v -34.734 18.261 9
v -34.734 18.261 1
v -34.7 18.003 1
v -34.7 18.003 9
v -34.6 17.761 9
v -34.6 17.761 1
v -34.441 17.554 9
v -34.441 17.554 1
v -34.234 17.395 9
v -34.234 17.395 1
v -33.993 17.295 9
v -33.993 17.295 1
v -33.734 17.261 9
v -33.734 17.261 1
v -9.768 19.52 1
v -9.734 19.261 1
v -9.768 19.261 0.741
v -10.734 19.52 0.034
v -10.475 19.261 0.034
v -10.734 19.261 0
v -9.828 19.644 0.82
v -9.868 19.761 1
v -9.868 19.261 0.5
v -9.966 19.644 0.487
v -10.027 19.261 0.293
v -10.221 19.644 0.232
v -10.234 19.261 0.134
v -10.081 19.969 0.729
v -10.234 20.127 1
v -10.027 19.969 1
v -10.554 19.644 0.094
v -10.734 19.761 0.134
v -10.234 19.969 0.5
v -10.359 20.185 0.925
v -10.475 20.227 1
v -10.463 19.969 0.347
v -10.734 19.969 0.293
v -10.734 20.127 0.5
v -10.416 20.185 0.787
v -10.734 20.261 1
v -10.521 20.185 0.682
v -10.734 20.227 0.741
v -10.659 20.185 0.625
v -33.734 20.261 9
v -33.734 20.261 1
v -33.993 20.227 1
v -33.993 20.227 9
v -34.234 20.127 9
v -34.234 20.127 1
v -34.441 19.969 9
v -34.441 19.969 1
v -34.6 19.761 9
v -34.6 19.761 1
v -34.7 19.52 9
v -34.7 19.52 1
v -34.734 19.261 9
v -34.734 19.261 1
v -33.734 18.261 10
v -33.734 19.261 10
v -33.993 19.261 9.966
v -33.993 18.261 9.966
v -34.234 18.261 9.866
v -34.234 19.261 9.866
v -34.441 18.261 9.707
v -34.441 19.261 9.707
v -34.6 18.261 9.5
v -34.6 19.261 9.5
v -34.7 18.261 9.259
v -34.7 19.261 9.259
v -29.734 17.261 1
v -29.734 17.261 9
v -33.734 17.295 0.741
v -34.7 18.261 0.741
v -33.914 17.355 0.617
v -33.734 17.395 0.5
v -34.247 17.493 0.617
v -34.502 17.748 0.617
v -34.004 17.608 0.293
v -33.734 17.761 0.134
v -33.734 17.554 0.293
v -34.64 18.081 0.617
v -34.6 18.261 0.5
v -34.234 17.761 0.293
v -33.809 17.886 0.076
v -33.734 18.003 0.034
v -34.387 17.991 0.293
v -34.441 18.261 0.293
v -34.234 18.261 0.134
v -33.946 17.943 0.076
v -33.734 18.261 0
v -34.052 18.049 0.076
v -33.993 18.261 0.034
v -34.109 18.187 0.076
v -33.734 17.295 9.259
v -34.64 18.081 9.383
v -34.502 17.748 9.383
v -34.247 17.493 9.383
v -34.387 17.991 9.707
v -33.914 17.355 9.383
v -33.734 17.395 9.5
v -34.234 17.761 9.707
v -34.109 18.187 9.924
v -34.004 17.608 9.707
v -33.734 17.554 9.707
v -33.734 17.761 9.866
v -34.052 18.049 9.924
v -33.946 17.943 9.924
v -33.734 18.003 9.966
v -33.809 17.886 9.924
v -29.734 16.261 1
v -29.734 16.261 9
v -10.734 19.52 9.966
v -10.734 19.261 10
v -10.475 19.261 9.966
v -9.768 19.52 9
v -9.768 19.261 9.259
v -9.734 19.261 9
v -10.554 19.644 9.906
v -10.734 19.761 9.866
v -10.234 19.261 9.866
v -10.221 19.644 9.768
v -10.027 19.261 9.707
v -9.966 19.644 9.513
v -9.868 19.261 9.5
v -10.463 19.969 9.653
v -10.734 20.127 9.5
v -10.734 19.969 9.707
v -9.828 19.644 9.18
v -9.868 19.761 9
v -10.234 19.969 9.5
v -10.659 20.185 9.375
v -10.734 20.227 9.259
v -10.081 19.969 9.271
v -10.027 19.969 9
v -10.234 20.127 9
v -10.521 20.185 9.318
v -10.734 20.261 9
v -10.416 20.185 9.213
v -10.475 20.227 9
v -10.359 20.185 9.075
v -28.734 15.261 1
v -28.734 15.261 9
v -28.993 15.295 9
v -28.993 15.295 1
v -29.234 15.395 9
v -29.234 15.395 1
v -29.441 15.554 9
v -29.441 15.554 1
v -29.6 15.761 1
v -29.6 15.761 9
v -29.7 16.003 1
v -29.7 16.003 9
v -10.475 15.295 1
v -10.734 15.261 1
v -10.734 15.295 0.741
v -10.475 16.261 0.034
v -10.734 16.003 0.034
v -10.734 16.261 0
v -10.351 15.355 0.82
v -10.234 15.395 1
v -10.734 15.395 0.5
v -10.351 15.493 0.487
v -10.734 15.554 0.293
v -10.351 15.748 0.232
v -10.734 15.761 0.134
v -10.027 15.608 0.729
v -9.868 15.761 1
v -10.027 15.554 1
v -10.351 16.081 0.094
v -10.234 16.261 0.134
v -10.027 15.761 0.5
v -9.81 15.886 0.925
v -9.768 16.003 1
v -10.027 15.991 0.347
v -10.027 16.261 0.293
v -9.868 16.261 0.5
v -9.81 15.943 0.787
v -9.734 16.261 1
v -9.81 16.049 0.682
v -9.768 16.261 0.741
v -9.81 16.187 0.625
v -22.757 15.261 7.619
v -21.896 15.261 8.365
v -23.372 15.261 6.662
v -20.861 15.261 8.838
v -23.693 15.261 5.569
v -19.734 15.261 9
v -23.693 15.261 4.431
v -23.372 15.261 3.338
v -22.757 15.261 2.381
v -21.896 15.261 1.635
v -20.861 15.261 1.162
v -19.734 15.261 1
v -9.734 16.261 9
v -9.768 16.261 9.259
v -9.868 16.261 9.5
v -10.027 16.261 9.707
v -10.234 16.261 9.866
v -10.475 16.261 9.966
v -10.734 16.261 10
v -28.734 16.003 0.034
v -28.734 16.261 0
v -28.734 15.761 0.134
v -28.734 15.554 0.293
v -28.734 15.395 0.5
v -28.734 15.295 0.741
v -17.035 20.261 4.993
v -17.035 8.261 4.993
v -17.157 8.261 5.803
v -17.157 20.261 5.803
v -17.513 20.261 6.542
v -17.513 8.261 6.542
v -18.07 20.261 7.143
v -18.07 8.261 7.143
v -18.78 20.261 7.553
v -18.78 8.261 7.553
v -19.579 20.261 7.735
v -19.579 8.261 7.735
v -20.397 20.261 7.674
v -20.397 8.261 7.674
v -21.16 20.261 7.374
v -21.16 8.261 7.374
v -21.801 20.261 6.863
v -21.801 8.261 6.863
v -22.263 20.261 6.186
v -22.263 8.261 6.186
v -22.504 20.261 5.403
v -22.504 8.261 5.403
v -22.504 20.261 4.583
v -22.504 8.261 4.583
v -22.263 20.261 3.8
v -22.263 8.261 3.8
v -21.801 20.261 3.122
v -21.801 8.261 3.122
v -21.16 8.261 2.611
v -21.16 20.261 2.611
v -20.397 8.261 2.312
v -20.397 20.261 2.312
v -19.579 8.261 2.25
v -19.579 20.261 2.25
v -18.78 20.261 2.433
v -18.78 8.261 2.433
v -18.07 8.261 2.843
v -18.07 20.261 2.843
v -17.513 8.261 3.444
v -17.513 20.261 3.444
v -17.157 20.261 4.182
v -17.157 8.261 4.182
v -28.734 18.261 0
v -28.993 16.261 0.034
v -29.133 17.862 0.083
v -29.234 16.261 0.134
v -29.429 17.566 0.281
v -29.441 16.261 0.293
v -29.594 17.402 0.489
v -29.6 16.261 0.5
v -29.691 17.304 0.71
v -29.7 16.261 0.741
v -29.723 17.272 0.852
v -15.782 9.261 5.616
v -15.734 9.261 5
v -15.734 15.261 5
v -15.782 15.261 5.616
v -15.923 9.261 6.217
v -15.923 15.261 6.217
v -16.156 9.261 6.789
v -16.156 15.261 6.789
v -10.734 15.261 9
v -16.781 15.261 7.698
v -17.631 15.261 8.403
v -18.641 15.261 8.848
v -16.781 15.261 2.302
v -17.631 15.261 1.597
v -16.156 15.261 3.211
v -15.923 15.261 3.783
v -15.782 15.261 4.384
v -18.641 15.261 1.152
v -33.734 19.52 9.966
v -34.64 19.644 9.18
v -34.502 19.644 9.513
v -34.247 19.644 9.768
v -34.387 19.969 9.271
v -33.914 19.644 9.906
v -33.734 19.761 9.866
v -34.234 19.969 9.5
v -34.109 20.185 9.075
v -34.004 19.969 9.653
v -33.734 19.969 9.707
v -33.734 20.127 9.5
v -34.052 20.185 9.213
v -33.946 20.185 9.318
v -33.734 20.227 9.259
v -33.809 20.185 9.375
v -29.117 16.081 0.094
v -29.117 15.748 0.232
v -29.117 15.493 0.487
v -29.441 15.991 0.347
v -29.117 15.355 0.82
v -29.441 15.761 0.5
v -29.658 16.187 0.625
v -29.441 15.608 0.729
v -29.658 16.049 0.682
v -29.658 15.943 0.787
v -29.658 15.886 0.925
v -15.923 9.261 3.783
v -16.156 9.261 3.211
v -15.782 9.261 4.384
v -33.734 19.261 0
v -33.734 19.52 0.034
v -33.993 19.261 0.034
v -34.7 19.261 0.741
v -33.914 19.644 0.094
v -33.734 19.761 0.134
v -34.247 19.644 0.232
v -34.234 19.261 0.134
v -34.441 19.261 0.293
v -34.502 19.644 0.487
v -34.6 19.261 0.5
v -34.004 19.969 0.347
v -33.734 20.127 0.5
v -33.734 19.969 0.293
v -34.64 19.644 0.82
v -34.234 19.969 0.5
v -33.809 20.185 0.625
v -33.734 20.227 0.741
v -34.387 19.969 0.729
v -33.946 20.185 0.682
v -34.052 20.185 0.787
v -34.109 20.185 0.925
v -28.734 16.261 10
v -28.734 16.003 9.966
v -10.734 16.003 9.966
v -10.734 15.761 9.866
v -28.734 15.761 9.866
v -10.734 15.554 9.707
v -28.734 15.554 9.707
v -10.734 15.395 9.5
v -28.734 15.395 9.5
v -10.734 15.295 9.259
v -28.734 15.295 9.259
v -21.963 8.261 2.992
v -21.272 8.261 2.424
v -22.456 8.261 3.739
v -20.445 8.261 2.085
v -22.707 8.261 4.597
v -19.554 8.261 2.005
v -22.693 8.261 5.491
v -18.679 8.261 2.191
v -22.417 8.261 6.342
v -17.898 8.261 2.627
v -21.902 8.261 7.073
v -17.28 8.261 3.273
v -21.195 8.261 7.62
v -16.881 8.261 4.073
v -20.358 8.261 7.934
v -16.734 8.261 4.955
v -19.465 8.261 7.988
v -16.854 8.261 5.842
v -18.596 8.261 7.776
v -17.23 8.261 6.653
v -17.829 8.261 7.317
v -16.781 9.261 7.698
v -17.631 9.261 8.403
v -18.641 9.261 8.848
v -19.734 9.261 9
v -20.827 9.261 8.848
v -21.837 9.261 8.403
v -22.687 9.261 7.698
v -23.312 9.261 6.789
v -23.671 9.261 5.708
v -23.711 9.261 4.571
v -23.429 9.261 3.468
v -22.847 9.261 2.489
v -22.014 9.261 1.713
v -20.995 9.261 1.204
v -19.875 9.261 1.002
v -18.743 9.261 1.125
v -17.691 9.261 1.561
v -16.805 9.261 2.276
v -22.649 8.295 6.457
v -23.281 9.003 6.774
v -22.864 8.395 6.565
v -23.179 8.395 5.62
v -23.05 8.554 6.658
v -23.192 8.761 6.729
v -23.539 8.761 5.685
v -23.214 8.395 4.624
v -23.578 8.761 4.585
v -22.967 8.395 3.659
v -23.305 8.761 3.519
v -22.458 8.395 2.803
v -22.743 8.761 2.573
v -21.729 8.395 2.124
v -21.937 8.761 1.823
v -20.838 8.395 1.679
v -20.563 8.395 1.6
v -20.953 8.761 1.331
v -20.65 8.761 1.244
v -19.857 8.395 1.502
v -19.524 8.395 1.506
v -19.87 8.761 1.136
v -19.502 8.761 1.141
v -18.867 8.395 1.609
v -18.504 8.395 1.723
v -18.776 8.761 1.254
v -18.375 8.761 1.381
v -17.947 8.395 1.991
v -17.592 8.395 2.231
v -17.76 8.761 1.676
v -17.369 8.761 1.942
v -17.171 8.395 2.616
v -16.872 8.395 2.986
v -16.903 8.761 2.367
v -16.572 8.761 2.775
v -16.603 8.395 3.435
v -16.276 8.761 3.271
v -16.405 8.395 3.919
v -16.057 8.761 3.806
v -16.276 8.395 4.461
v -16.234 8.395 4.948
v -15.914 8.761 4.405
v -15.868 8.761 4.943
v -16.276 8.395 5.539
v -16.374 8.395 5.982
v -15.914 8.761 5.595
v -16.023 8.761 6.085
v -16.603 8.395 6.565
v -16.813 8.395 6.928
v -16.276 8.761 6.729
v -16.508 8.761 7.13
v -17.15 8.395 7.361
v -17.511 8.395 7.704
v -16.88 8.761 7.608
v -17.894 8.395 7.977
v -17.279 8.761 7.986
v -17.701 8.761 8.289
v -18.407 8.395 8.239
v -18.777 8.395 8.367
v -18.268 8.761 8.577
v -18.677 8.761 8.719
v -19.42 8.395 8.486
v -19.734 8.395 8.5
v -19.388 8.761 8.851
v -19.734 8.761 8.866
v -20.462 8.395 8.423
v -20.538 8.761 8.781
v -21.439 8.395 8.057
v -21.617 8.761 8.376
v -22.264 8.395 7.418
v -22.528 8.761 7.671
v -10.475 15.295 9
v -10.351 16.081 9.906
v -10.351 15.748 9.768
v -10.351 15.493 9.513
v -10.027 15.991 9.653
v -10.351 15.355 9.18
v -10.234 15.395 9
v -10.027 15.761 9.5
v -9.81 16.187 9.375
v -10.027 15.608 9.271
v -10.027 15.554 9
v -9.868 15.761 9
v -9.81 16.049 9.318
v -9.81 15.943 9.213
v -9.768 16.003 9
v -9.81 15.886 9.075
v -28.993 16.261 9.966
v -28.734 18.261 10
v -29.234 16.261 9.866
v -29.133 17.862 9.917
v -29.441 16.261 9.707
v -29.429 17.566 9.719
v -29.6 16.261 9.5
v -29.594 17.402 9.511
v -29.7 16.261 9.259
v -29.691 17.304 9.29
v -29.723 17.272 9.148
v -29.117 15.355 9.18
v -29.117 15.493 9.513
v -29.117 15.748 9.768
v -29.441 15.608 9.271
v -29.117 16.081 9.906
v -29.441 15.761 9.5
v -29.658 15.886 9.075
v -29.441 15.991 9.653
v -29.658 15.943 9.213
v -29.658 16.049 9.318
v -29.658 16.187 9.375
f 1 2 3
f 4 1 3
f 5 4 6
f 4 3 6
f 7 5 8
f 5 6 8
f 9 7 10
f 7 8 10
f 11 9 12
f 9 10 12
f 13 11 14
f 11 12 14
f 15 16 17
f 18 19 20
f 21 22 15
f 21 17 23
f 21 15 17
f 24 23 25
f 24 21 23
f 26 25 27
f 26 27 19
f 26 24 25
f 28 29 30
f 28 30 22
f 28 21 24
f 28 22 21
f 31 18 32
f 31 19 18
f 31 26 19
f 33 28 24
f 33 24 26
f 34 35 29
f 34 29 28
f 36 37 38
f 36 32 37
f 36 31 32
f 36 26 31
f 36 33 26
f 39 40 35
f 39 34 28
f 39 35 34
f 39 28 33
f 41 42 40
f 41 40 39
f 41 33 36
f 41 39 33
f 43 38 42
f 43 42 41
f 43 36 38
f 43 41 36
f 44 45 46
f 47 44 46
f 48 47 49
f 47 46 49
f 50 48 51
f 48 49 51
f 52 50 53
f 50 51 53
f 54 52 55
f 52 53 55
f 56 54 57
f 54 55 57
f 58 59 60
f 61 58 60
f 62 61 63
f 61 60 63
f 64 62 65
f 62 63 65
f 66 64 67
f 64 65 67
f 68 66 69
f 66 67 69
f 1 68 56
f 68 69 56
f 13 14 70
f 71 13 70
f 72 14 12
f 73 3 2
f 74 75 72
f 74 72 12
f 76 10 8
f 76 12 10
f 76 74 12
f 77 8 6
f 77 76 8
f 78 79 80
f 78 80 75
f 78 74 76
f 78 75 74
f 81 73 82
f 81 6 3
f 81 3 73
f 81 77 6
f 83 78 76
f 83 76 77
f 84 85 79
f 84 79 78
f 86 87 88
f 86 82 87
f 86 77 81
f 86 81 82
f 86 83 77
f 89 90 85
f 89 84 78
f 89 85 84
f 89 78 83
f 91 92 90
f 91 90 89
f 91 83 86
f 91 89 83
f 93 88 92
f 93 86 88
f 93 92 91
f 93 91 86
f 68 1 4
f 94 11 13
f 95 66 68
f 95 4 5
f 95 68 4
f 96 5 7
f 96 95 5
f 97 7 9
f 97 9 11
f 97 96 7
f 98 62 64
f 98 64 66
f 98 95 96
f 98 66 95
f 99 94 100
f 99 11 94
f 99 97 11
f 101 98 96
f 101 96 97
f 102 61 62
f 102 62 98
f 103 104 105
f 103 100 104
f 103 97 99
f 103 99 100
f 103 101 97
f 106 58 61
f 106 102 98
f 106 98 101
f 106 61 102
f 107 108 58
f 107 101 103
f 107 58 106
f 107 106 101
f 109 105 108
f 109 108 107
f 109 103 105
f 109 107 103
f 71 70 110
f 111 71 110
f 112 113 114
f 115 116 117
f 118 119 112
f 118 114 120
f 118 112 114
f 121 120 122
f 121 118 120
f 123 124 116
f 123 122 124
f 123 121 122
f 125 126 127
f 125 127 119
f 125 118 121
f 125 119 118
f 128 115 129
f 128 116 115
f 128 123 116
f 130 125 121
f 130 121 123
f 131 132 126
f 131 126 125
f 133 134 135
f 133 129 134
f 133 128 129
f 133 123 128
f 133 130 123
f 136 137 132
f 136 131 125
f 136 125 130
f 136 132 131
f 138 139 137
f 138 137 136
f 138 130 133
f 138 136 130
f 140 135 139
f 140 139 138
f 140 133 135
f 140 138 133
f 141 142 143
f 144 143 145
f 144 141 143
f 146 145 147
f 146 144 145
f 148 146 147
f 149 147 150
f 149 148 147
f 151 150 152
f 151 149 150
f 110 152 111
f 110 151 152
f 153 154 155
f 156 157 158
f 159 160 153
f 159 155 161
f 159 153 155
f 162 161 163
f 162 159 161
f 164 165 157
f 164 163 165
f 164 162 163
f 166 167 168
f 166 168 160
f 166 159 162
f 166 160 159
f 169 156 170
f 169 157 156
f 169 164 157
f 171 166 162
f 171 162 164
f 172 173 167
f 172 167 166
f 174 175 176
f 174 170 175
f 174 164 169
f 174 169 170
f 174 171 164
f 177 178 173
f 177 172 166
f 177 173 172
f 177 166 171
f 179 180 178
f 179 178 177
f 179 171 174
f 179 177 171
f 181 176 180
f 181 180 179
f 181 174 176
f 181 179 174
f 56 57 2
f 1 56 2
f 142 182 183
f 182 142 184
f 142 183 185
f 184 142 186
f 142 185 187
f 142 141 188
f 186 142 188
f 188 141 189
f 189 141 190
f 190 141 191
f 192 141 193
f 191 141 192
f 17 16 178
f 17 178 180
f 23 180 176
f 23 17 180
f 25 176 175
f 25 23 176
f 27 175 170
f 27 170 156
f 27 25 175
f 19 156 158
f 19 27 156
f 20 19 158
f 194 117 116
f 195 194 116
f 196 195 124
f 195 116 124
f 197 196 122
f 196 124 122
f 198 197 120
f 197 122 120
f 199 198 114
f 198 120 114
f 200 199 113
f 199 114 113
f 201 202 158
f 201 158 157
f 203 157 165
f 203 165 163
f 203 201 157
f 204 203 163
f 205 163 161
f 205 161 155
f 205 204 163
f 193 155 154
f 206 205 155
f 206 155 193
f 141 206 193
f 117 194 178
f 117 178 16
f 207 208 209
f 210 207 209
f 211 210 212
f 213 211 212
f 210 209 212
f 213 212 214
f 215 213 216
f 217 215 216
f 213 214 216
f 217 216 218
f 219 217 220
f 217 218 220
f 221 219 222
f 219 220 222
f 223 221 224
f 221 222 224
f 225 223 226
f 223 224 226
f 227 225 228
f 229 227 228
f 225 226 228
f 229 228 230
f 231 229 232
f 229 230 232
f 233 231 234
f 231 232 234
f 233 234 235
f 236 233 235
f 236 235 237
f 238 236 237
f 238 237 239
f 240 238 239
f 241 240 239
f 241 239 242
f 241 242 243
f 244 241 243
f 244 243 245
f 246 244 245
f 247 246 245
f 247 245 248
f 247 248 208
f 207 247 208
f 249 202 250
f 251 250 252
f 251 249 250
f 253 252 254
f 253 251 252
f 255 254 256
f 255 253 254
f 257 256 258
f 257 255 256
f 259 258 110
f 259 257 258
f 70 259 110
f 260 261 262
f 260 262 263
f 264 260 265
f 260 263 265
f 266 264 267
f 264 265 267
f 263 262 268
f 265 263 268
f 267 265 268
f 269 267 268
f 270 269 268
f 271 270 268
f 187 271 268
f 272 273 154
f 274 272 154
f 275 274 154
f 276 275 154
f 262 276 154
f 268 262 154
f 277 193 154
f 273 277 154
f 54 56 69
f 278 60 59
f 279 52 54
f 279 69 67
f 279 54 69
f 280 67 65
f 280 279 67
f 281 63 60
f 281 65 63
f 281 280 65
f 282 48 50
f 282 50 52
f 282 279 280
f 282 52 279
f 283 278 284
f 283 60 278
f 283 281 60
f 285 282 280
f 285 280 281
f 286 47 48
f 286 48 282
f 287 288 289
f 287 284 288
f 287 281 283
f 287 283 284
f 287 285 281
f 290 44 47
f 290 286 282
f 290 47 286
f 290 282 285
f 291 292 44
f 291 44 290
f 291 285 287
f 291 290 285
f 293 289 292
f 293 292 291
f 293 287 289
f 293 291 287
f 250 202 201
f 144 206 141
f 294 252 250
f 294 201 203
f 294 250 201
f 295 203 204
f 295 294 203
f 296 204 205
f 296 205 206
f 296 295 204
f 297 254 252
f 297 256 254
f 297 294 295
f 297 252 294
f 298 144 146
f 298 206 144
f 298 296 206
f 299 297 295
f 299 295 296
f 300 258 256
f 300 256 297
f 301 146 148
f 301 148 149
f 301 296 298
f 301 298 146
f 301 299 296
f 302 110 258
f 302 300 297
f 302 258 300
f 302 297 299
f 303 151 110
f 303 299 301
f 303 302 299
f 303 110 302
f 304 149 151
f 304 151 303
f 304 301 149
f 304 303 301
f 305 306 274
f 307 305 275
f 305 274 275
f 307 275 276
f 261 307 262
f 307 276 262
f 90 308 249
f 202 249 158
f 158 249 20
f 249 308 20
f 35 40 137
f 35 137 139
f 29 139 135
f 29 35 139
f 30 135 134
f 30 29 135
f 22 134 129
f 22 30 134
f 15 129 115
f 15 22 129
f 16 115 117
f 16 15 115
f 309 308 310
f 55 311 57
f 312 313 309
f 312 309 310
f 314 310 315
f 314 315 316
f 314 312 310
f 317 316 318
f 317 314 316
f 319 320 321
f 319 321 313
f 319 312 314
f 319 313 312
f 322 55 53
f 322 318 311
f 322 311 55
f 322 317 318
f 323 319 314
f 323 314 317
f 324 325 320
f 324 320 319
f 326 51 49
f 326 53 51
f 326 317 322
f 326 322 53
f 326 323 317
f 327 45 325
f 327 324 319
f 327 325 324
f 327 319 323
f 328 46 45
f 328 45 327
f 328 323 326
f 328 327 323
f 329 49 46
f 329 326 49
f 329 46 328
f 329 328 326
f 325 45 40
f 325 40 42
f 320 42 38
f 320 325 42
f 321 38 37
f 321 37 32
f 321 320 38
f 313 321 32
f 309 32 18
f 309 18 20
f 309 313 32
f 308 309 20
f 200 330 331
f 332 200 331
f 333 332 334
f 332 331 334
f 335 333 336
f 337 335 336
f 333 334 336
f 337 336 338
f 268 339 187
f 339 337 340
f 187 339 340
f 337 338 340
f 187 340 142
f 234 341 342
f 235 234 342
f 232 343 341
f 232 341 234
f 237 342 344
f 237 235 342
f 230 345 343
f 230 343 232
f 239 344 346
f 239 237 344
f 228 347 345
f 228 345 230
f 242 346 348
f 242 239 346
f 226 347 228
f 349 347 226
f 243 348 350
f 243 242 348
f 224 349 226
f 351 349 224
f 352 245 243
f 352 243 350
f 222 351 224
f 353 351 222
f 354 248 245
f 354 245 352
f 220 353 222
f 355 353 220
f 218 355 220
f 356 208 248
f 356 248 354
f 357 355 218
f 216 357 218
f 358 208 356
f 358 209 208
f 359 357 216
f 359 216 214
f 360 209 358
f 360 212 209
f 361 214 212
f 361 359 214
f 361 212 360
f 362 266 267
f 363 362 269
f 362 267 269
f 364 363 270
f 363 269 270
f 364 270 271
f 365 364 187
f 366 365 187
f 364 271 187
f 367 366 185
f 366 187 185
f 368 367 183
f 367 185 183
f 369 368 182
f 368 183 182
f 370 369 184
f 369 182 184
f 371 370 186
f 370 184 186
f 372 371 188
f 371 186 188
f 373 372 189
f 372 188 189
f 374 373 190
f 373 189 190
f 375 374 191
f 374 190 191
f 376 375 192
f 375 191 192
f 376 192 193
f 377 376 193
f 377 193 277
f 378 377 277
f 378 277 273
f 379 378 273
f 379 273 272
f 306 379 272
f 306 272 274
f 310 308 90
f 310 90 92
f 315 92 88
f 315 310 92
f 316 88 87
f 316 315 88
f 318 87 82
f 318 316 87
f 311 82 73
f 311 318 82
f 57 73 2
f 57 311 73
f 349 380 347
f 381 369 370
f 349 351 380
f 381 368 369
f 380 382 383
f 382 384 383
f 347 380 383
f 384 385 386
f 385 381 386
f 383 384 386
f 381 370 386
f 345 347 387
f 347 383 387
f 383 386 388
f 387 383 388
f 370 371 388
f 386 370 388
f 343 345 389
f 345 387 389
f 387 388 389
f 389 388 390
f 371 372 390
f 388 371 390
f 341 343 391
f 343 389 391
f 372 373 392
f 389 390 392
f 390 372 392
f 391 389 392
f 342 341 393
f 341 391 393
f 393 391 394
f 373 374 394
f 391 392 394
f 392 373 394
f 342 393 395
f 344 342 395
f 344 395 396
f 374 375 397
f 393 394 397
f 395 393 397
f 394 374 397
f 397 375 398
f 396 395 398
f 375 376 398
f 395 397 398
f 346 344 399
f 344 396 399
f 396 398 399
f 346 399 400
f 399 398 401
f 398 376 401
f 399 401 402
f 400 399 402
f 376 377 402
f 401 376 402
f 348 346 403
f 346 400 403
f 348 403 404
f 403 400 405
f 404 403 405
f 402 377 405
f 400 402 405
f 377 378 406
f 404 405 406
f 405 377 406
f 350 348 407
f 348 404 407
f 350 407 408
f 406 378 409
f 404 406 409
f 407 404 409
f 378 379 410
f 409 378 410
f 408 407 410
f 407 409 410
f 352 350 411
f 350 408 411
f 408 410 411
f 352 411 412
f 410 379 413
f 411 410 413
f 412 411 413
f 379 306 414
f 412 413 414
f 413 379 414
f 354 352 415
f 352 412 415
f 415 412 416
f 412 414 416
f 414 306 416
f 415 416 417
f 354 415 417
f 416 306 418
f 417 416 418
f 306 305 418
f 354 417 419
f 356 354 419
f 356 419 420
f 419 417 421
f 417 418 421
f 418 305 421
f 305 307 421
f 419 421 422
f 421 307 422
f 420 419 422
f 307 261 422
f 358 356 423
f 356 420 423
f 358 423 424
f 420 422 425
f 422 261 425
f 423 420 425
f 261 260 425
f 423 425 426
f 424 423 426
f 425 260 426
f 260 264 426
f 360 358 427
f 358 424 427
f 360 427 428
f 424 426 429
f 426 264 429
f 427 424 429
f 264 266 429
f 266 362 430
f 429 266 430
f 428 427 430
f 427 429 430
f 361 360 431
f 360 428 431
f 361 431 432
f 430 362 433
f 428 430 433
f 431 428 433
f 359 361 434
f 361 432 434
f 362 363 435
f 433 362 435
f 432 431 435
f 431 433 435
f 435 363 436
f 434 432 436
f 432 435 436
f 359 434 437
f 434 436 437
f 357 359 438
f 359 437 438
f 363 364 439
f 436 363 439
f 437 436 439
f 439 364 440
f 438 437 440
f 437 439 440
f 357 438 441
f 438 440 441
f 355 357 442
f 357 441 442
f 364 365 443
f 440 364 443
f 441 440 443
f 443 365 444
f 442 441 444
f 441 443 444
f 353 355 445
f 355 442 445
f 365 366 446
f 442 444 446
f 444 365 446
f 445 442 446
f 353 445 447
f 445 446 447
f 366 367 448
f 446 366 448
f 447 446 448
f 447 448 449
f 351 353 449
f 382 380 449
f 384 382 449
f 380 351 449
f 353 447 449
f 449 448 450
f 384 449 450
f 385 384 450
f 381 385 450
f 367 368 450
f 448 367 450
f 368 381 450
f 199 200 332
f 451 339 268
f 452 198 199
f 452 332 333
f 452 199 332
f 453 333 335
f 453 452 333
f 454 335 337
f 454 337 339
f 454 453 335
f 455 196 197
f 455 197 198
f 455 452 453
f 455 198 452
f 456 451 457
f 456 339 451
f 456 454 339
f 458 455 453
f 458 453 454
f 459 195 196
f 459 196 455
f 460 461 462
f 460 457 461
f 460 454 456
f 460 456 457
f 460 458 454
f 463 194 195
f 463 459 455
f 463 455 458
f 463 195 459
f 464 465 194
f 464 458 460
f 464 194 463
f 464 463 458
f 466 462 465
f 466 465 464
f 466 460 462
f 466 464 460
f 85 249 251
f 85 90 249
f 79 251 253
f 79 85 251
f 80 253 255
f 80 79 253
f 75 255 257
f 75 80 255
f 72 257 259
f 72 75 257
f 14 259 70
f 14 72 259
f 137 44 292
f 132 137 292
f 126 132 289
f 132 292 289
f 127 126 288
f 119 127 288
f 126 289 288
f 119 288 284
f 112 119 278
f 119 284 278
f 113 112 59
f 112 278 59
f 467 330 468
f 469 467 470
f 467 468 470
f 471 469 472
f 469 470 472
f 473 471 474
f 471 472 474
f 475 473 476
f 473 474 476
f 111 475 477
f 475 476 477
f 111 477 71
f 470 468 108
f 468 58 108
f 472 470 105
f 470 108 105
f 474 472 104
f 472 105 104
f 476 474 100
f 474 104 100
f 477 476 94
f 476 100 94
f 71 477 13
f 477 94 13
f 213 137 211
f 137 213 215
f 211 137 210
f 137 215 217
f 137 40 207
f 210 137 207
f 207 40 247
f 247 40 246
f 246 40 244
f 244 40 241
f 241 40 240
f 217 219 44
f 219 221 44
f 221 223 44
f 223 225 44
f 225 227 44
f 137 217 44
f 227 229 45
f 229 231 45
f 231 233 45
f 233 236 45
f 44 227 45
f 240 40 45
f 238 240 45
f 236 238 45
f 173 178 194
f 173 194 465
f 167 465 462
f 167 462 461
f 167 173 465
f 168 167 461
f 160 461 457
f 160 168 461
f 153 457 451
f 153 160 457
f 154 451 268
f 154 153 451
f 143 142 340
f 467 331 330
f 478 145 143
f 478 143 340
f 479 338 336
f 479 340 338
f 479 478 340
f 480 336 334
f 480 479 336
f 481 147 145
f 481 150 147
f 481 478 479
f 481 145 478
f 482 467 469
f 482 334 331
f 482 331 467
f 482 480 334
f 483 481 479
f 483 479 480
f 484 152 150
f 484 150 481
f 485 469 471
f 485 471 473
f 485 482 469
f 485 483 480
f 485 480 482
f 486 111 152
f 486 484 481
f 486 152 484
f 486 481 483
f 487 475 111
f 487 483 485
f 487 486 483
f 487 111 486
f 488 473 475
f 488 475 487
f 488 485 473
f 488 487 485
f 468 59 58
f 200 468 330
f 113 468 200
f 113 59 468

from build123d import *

# Parameters (mm, degrees)
F1_DEPTH     = 10
F3_DEPTH     = 7
F5_D         = 5.5
F6_T1_DEPTH  = 3
F6_T3_DEPTH  = 1
F6_T5_DEPTH  = 8
F6_T7_DEPTH  = 23
F6_T9_DEPTH  = 18
F6_T11_DEPTH = 4
F6_T13_DEPTH = 1
F6_S17_W     = 1
F6_S17_H     = 1
F6_T18_DEPTH = 1
F6_S23_W     = 1
F6_S23_H     = 1
F6_T24_DEPTH = 1
F6_S29_W     = 1
F6_S29_H     = 1
F6_T30_DEPTH = 1
F6_S35_W     = 1
F6_S35_H     = 1
F6_T36_DEPTH = 1
F6_S41_W     = 1
F6_S41_H     = 1
F6_T42_DEPTH = 1
F6_S47_W     = 1
F6_S47_H     = 1
F6_T48_DEPTH = 1
F6_S53_W     = 1
F6_S53_H     = 1
F6_T54_DEPTH = 1
F6_S59_W     = 1
F6_S59_H     = 1
F6_T60_DEPTH = 1
F6_S65_W     = 1
F6_S65_H     = 1
F6_T66_DEPTH = 1
F6_S71_W     = 1
F6_S71_H     = 1
F6_T72_DEPTH = 1
F6_T81_DEPTH = 6.5
F6_T85_DEPTH = 3.5
F6_T92_DEPTH = 6.5
F6_T96_DEPTH = 3.5


# Not quite as in the source:
# - a fillet or chamfer that OpenCascade refuses, or shapes differently, is made with other operations: its cross-section is extruded or revolved along the edge and cut away or added


with BuildPart() as f1:
    # F0 (on Top) → F1 (new body)
    with BuildSketch(Plane.XY):
        Polygon((-9.7338430583, 20.2614087611), (-34.7338430583, 20.2614087611), (-34.7338430583, 17.2614087611), (-29.7338430583, 17.2614087611), (-29.7338430583, 15.2614087611), (-9.7338430583, 15.2614087611), align=None)
    extrude(amount=F1_DEPTH)

    # F2 (on face) → F3 (join)
    with BuildSketch(Plane.XZ.offset(-15.2614087611)):
        with BuildLine():
            Line((-16.1561342943, 3.211145618), (-19.7338430583, 5))
            Line((-19.7338430583, 5), (-23.3115518223, 3.211145618))
            ThreePointArc((-23.3115518223, 3.211145618), (-19.7338430583, 1), (-16.1561342943, 3.211145618))
        make_face()
        with BuildLine():
            Line((-16.1561342943, 6.788854382), (-19.7338430583, 5))
            Line((-19.7338430583, 5), (-16.1561342943, 3.211145618))
            ThreePointArc((-16.1561342943, 3.211145618), (-15.8408471005, 4.0809883178), (-15.7338430583, 5))
            ThreePointArc((-15.7338430583, 5), (-15.8408471005, 5.9190116822), (-16.1561342943, 6.788854382))
        make_face()
        with BuildLine():
            ThreePointArc((-16.1561342943, 6.788854382), (-19.7338430583, 9), (-23.3115518223, 6.788854382))
            Line((-23.3115518223, 6.788854382), (-19.7338430583, 5))
            Line((-19.7338430583, 5), (-16.1561342943, 6.788854382))
        make_face()
        with BuildLine():
            Line((-19.7338430583, 5), (-23.3115518223, 6.788854382))
            ThreePointArc((-23.3115518223, 6.788854382), (-23.7338430583, 5), (-23.3115518223, 3.211145618))
            Line((-23.3115518223, 3.211145618), (-19.7338430583, 5))
        make_face()
    extrude(amount=F3_DEPTH)

    # F5 (through all)
    with Locations(Plane(origin=(0, 20.2614087611, 0), x_dir=(-1, 0, 0), z_dir=(0, 1, 0))):
        with Locations((19.7849275367, 4.9927774844)):
            Hole(F5_D / 2)

    # F6: fillet of radius 1 on 18 edges, made by hand

    # F6_s2 → F6_t1 (cut)
    with BuildSketch(Plane.XZ.offset(-19.2614087611)):
        with BuildLine():
            ThreePointArc((-9.7338430583, 9), (-10.0267362772, 9.7071067812), (-10.7338430583, 10))
            Line((-10.7338430583, 10), (-9.7338430583, 10))
            Line((-9.7338430583, 10), (-9.7338430583, 9))
        make_face()
        with BuildLine():
            ThreePointArc((-9.7338430583, 1), (-10.0267362772, 0.2928932188), (-10.7338430583, 0))
            Line((-10.7338430583, 0), (-9.7338430583, 0))
            Line((-9.7338430583, 0), (-9.7338430583, 1))
        make_face()
    extrude(amount=F6_T1_DEPTH, mode=Mode.SUBTRACT)

    # F6_s4 → F6_t3 (cut)
    with BuildSketch(Plane.XZ.offset(-19.2614087611)):
        with BuildLine():
            ThreePointArc((-33.7338430583, 10), (-34.4409498395, 9.7071067812), (-34.7338430583, 9))
            Line((-34.7338430583, 9), (-34.7338430583, 10))
            Line((-34.7338430583, 10), (-33.7338430583, 10))
        make_face()
        with BuildLine():
            ThreePointArc((-33.7338430583, 0), (-34.4409498395, 0.2928932188), (-34.7338430583, 1))
            Line((-34.7338430583, 1), (-34.7338430583, 0))
            Line((-34.7338430583, 0), (-33.7338430583, 0))
        make_face()
    extrude(amount=F6_T3_DEPTH, mode=Mode.SUBTRACT)

    # F6_s6 → F6_t5 (cut)
    with BuildSketch(Plane.XY.offset(1)):
        with BuildLine():
            ThreePointArc((-33.7338430583, 20.2614087611), (-34.4409498395, 19.9685155423), (-34.7338430583, 19.2614087611))
            Line((-34.7338430583, 19.2614087611), (-34.7338430583, 20.2614087611))
            Line((-34.7338430583, 20.2614087611), (-33.7338430583, 20.2614087611))
        make_face()
        with BuildLine():
            ThreePointArc((-34.7338430583, 18.2614087611), (-34.4409498395, 17.55430198), (-33.7338430583, 17.2614087611))
            Line((-33.7338430583, 17.2614087611), (-34.7338430583, 17.2614087611))
            Line((-34.7338430583, 17.2614087611), (-34.7338430583, 18.2614087611))
        make_face()
        with BuildLine():
            ThreePointArc((-10.7338430583, 20.2614087611), (-10.0267362772, 19.9685155423), (-9.7338430583, 19.2614087611))
            Line((-9.7338430583, 19.2614087611), (-9.7338430583, 20.2614087611))
            Line((-9.7338430583, 20.2614087611), (-10.7338430583, 20.2614087611))
        make_face()
        with BuildLine():
            ThreePointArc((-28.7338430583, 15.2614087611), (-29.4409498395, 15.55430198), (-29.7338430583, 16.2614087611))
            Line((-29.7338430583, 16.2614087611), (-29.7338430583, 15.2614087611))
            Line((-29.7338430583, 15.2614087611), (-28.7338430583, 15.2614087611))
        make_face()
        with BuildLine():
            ThreePointArc((-9.7338430583, 16.2614087611), (-10.0267362772, 15.55430198), (-10.7338430583, 15.2614087611))
            Line((-10.7338430583, 15.2614087611), (-9.7338430583, 15.2614087611))
            Line((-9.7338430583, 15.2614087611), (-9.7338430583, 16.2614087611))
        make_face()
    extrude(amount=F6_T5_DEPTH, mode=Mode.SUBTRACT)

    # F6_s8 → F6_t7 (cut)
    with BuildSketch(Plane.YZ.offset(-33.7338430583)):
        with BuildLine():
            ThreePointArc((20.2614087611, 1), (19.9685155423, 0.2928932188), (19.2614087611, 0))
            Line((19.2614087611, 0), (20.2614087611, 0))
            Line((20.2614087611, 0), (20.2614087611, 1))
        make_face()
        with BuildLine():
            ThreePointArc((20.2614087611, 9), (19.9685155423, 9.7071067812), (19.2614087611, 10))
            Line((19.2614087611, 10), (20.2614087611, 10))
            Line((20.2614087611, 10), (20.2614087611, 9))
        make_face()
    extrude(amount=F6_T7_DEPTH, mode=Mode.SUBTRACT)

    # F6_s10 → F6_t9 (cut)
    with BuildSketch(Plane.YZ.offset(-28.7338430583)):
        with BuildLine():
            ThreePointArc((16.2614087611, 0), (15.55430198, 0.2928932188), (15.2614087611, 1))
            Line((15.2614087611, 1), (15.2614087611, 0))
            Line((15.2614087611, 0), (16.2614087611, 0))
        make_face()
        with BuildLine():
            ThreePointArc((16.2614087611, 10), (15.55430198, 9.7071067812), (15.2614087611, 9))
            Line((15.2614087611, 9), (15.2614087611, 10))
            Line((15.2614087611, 10), (16.2614087611, 10))
        make_face()
    extrude(amount=F6_T9_DEPTH, mode=Mode.SUBTRACT)

    # F6_s12 → F6_t11 (cut)
    with BuildSketch(Plane.YZ.offset(-33.7338430583)):
        with BuildLine():
            ThreePointArc((18.2614087611, 0), (17.55430198, 0.2928932188), (17.2614087611, 1))
            Line((17.2614087611, 1), (17.2614087611, 0))
            Line((17.2614087611, 0), (18.2614087611, 0))
        make_face()
        with BuildLine():
            ThreePointArc((18.2614087611, 10), (17.55430198, 9.7071067812), (17.2614087611, 9))
            Line((17.2614087611, 9), (17.2614087611, 10))
            Line((17.2614087611, 10), (18.2614087611, 10))
        make_face()
    extrude(amount=F6_T11_DEPTH, mode=Mode.SUBTRACT)

    # F6_s14 → F6_t13 (cut)
    with BuildSketch(Plane.XZ.offset(-17.2614087611)):
        with BuildLine():
            ThreePointArc((-28.7338430583, 0), (-29.4409498395, 0.2928932188), (-29.7338430583, 1))
            Line((-29.7338430583, 1), (-29.7338430583, 0))
            Line((-29.7338430583, 0), (-28.7338430583, 0))
        make_face()
        with BuildLine():
            ThreePointArc((-28.7338430583, 10), (-29.4409498395, 9.7071067812), (-29.7338430583, 9))
            Line((-29.7338430583, 9), (-29.7338430583, 10))
            Line((-29.7338430583, 10), (-28.7338430583, 10))
        make_face()
    extrude(amount=F6_T13_DEPTH, mode=Mode.SUBTRACT)


with BuildPart() as f6_tool16:
    # F6_s17 → F6_t18 (new body)
    with BuildSketch(Plane.YZ.offset(-10.7338430583)):
        with Locations((15.7614087611, 9.5)):
            Rectangle(F6_S17_W, F6_S17_H)
    extrude(amount=F6_T18_DEPTH)

    # F6_s19 → F6_t20 (revolve, cut)
    with BuildSketch(Plane(origin=(-10.7338430583, 16.2614087611, 9), x_dir=(0, 0.7071067812, -0.7071067812), z_dir=(0, -0.7071067812, -0.7071067812))):
        with BuildLine():
            ThreePointArc((0, -1), (1, 0), (0, 1))
            Line((0, 1), (0, -1))
        make_face()
    revolve(axis=Axis((-10.7338430583, 16.2614087611, 9), (1, 0, 0)), mode=Mode.SUBTRACT)


with BuildPart() as f1_1:
    add(f1.part)

    # F6_t15: cut F6_tool16
    add(f6_tool16.part, mode=Mode.SUBTRACT)


with BuildPart() as f6_tool22:
    # F6_s23 → F6_t24 (new body)
    with BuildSketch(Plane.XZ.offset(-19.2614087611)):
        with Locations((-10.2338430583, 9.5)):
            Rectangle(F6_S23_W, F6_S23_H)
    extrude(amount=-F6_T24_DEPTH)

    # F6_s25 → F6_t26 (revolve, cut)
    with BuildSketch(Plane(origin=(-10.7338430583, 19.2614087611, 9), x_dir=(-0.7071067812, 0, -0.7071067812), z_dir=(0.7071067812, 0, -0.7071067812))):
        with BuildLine():
            ThreePointArc((0, -1), (1, 0), (0, 1))
            Line((0, 1), (0, -1))
        make_face()
    revolve(axis=Axis((-10.7338430583, 19.2614087611, 9), (0, 1, 0)), mode=Mode.SUBTRACT)


with BuildPart() as f1_2:
    add(f1_1.part)

    # F6_t21: cut F6_tool22
    add(f6_tool22.part, mode=Mode.SUBTRACT)


with BuildPart() as f6_tool28:
    # F6_s29 → F6_t30 (new body)
    with BuildSketch(Plane.YZ.offset(-10.7338430583)):
        with Locations((15.7614087611, 0.5)):
            Rectangle(F6_S29_W, F6_S29_H)
    extrude(amount=F6_T30_DEPTH)

    # F6_s31 → F6_t32 (revolve, cut)
    with BuildSketch(Plane(origin=(-10.7338430583, 16.2614087611, 1), x_dir=(0, 0.7071067812, 0.7071067812), z_dir=(0, 0.7071067812, -0.7071067812))):
        with BuildLine():
            ThreePointArc((0, -1), (1, 0), (0, 1))
            Line((0, 1), (0, -1))
        make_face()
    revolve(axis=Axis((-10.7338430583, 16.2614087611, 1), (1, 0, 0)), mode=Mode.SUBTRACT)


with BuildPart() as f1_3:
    add(f1_2.part)

    # F6_t27: cut F6_tool28
    add(f6_tool28.part, mode=Mode.SUBTRACT)


with BuildPart() as f6_tool34:
    # F6_s35 → F6_t36 (new body)
    with BuildSketch(Plane.XZ.offset(-19.2614087611)):
        with Locations((-10.2338430583, 0.5)):
            Rectangle(F6_S35_W, F6_S35_H)
    extrude(amount=-F6_T36_DEPTH)

    # F6_s37 → F6_t38 (revolve, cut)
    with BuildSketch(Plane(origin=(-10.7338430583, 19.2614087611, 1), x_dir=(-0.7071067812, 0, 0.7071067812), z_dir=(-0.7071067812, 0, -0.7071067812))):
        with BuildLine():
            ThreePointArc((0, -1), (1, 0), (0, 1))
            Line((0, 1), (0, -1))
        make_face()
    revolve(axis=Axis((-10.7338430583, 19.2614087611, 1), (0, 1, 0)), mode=Mode.SUBTRACT)


with BuildPart() as f1_4:
    add(f1_3.part)

    # F6_t33: cut F6_tool34
    add(f6_tool34.part, mode=Mode.SUBTRACT)


with BuildPart() as f6_tool40:
    # F6_s41 → F6_t42 (new body)
    with BuildSketch(Plane.XZ.offset(-19.2614087611)):
        with Locations((-34.2338430583, 9.5)):
            Rectangle(F6_S41_W, F6_S41_H)
    extrude(amount=-F6_T42_DEPTH)

    # F6_s43 → F6_t44 (revolve, cut)
    with BuildSketch(Plane(origin=(-33.7338430583, 19.2614087611, 9), x_dir=(0.7071067812, 0, -0.7071067812), z_dir=(0.7071067812, 0, 0.7071067812))):
        with BuildLine():
            ThreePointArc((0, -1), (1, 0), (0, 1))
            Line((0, 1), (0, -1))
        make_face()
    revolve(axis=Axis((-33.7338430583, 19.2614087611, 9), (0, 1, 0)), mode=Mode.SUBTRACT)


with BuildPart() as f1_5:
    add(f1_4.part)

    # F6_t39: cut F6_tool40
    add(f6_tool40.part, mode=Mode.SUBTRACT)


with BuildPart() as f6_tool46:
    # F6_s47 → F6_t48 (new body)
    with BuildSketch(Plane.XY.offset(9)):
        with Locations((-34.2338430583, 17.7614087611)):
            Rectangle(F6_S47_W, F6_S47_H)
    extrude(amount=F6_T48_DEPTH)

    # F6_s49 → F6_t50 (revolve, cut)
    with BuildSketch(Plane(origin=(-33.7338430583, 18.2614087611, 9), x_dir=(0.7071067812, 0.7071067812, 0), z_dir=(0.7071067812, -0.7071067812, 0))):
        with BuildLine():
            ThreePointArc((0, -1), (1, 0), (0, 1))
            Line((0, 1), (0, -1))
        make_face()
    revolve(axis=Axis((-33.7338430583, 18.2614087611, 9), (0, 0, 1)), mode=Mode.SUBTRACT)


with BuildPart() as f1_6:
    add(f1_5.part)

    # F6_t45: cut F6_tool46
    add(f6_tool46.part, mode=Mode.SUBTRACT)


with BuildPart() as f6_tool52:
    # F6_s53 → F6_t54 (new body)
    with BuildSketch(Plane.XZ.offset(-19.2614087611)):
        with Locations((-34.2338430583, 0.5)):
            Rectangle(F6_S53_W, F6_S53_H)
    extrude(amount=-F6_T54_DEPTH)

    # F6_s55 → F6_t56 (revolve, cut)
    with BuildSketch(Plane(origin=(-33.7338430583, 19.2614087611, 1), x_dir=(0.7071067812, 0, 0.7071067812), z_dir=(-0.7071067812, 0, 0.7071067812))):
        with BuildLine():
            ThreePointArc((0, -1), (1, 0), (0, 1))
            Line((0, 1), (0, -1))
        make_face()
    revolve(axis=Axis((-33.7338430583, 19.2614087611, 1), (0, 1, 0)), mode=Mode.SUBTRACT)


with BuildPart() as f1_7:
    add(f1_6.part)

    # F6_t51: cut F6_tool52
    add(f6_tool52.part, mode=Mode.SUBTRACT)


with BuildPart() as f6_tool58:
    # F6_s59 → F6_t60 (new body)
    with BuildSketch(Plane.XY.offset(1)):
        with Locations((-34.2338430583, 17.7614087611)):
            Rectangle(F6_S59_W, F6_S59_H)
    extrude(amount=-F6_T60_DEPTH)

    # F6_s61 → F6_t62 (revolve, cut)
    with BuildSketch(Plane(origin=(-33.7338430583, 18.2614087611, 1), x_dir=(0.7071067812, 0.7071067812, 0), z_dir=(-0.7071067812, 0.7071067812, 0))):
        with BuildLine():
            ThreePointArc((0, -1), (1, 0), (0, 1))
            Line((0, 1), (0, -1))
        make_face()
    revolve(axis=Axis((-33.7338430583, 18.2614087611, 1), (0, 0, -1)), mode=Mode.SUBTRACT)


with BuildPart() as f1_8:
    add(f1_7.part)

    # F6_t57: cut F6_tool58
    add(f6_tool58.part, mode=Mode.SUBTRACT)


with BuildPart() as f6_tool64:
    # F6_s65 → F6_t66 (new body)
    with BuildSketch(Plane.YZ.offset(-28.7338430583)):
        with Locations((15.7614087611, 0.5)):
            Rectangle(F6_S65_W, F6_S65_H)
    extrude(amount=-F6_T66_DEPTH)

    # F6_s67 → F6_t68 (revolve, cut)
    with BuildSketch(Plane(origin=(-28.7338430583, 16.2614087611, 1), x_dir=(0, 0.7071067812, 0.7071067812), z_dir=(0, -0.7071067812, 0.7071067812))):
        with BuildLine():
            ThreePointArc((0, -1), (1, 0), (0, 1))
            Line((0, 1), (0, -1))
        make_face()
    revolve(axis=Axis((-28.7338430583, 16.2614087611, 1), (-1, 0, 0)), mode=Mode.SUBTRACT)


with BuildPart() as f1_9:
    add(f1_8.part)

    # F6_t63: cut F6_tool64
    add(f6_tool64.part, mode=Mode.SUBTRACT)


with BuildPart() as f6_tool70:
    # F6_s71 → F6_t72 (new body)
    with BuildSketch(Plane.YZ.offset(-28.7338430583)):
        with Locations((15.7614087611, 9.5)):
            Rectangle(F6_S71_W, F6_S71_H)
    extrude(amount=-F6_T72_DEPTH)

    # F6_s73 → F6_t74 (revolve, cut)
    with BuildSketch(Plane(origin=(-28.7338430583, 16.2614087611, 9), x_dir=(0, 0.7071067812, -0.7071067812), z_dir=(0, 0.7071067812, 0.7071067812))):
        with BuildLine():
            ThreePointArc((0, -1), (1, 0), (0, 1))
            Line((0, 1), (0, -1))
        make_face()
    revolve(axis=Axis((-28.7338430583, 16.2614087611, 9), (-1, 0, 0)), mode=Mode.SUBTRACT)


with BuildPart() as f1_10:
    add(f1_9.part)

    # F6_t69: cut F6_tool70
    add(f6_tool70.part, mode=Mode.SUBTRACT)

    # F6_s75 → F6_t76 (revolve, cut)
    with BuildSketch(Plane(origin=(-1.9467686117, 0, -3.8935372233), x_dir=(0, 1, 0), z_dir=(0.4472135955, 0, 0.894427191))):
        with BuildLine():
            ThreePointArc((8.2614087611, 22.8865537918), (8.55430198, 23.593660573), (9.2614087611, 23.8865537918))
            Line((9.2614087611, 23.8865537918), (8.2614087611, 23.8865537918))
            Line((8.2614087611, 23.8865537918), (8.2614087611, 22.8865537918))
        make_face()
    revolve(axis=Axis((-19.7338430583, 8.2614087611, 5), (0, -1, 0)), mode=Mode.SUBTRACT)


with BuildPart() as f6_tool79:
    # F6_s80 → F6_t81 (new body)
    with BuildSketch(Plane.YZ.offset(-33.7338430583)):
        with BuildLine():
            ThreePointArc((18.2614087611, 0), (17.55430198, 0.2928932188), (17.2614087611, 1))
            Line((17.2614087611, 1), (17.2614087611, 0))
            Line((17.2614087611, 0), (18.2614087611, 0))
        make_face()
    extrude(amount=F6_T81_DEPTH)

    split(bisect_by=Plane.YZ.offset(-29.7338430583), keep=Keep.TOP)


with BuildPart() as f6_tool83:
    # F6_s84 → F6_t85 (new body)
    with BuildSketch(Plane.XZ.offset(-19.7614087611)):
        with BuildLine():
            ThreePointArc((-28.7338430583, 0), (-29.4409498395, 0.2928932188), (-29.7338430583, 1))
            Line((-29.7338430583, 1), (-29.7338430583, 0))
            Line((-29.7338430583, 0), (-28.7338430583, 0))
        make_face()
    extrude(amount=F6_T85_DEPTH)

    split(bisect_by=Plane.XZ.offset(-17.2614087611), keep=Keep.BOTTOM)


with BuildPart() as f6_tool79_1:
    add(f6_tool79.part)

    # F6_t87: intersect F6_tool83
    add(f6_tool83.part, mode=Mode.INTERSECT)


with BuildPart() as f1_11:
    add(f1_10.part)

    # F6_t77: cut F6_tool79
    add(f6_tool79_1.part, mode=Mode.SUBTRACT)


with BuildPart() as f6_tool90:
    # F6_s91 → F6_t92 (new body)
    with BuildSketch(Plane.YZ.offset(-33.7338430583)):
        with BuildLine():
            ThreePointArc((18.2614087611, 10), (17.55430198, 9.7071067812), (17.2614087611, 9))
            Line((17.2614087611, 9), (17.2614087611, 10))
            Line((17.2614087611, 10), (18.2614087611, 10))
        make_face()
    extrude(amount=F6_T92_DEPTH)

    split(bisect_by=Plane.YZ.offset(-29.7338430583), keep=Keep.TOP)


with BuildPart() as f6_tool94:
    # F6_s95 → F6_t96 (new body)
    with BuildSketch(Plane.XZ.offset(-19.7614087611)):
        with BuildLine():
            ThreePointArc((-28.7338430583, 10), (-29.4409498395, 9.7071067812), (-29.7338430583, 9))
            Line((-29.7338430583, 9), (-29.7338430583, 10))
            Line((-29.7338430583, 10), (-28.7338430583, 10))
        make_face()
    extrude(amount=F6_T96_DEPTH)

    split(bisect_by=Plane.XZ.offset(-17.2614087611), keep=Keep.BOTTOM)


with BuildPart() as f6_tool90_1:
    add(f6_tool90.part)

    # F6_t98: intersect F6_tool94
    add(f6_tool94.part, mode=Mode.INTERSECT)


with BuildPart() as f1_12:
    add(f1_11.part)

    # F6_t88: cut F6_tool90
    add(f6_tool90_1.part, mode=Mode.SUBTRACT)


solid = f1_12.part
